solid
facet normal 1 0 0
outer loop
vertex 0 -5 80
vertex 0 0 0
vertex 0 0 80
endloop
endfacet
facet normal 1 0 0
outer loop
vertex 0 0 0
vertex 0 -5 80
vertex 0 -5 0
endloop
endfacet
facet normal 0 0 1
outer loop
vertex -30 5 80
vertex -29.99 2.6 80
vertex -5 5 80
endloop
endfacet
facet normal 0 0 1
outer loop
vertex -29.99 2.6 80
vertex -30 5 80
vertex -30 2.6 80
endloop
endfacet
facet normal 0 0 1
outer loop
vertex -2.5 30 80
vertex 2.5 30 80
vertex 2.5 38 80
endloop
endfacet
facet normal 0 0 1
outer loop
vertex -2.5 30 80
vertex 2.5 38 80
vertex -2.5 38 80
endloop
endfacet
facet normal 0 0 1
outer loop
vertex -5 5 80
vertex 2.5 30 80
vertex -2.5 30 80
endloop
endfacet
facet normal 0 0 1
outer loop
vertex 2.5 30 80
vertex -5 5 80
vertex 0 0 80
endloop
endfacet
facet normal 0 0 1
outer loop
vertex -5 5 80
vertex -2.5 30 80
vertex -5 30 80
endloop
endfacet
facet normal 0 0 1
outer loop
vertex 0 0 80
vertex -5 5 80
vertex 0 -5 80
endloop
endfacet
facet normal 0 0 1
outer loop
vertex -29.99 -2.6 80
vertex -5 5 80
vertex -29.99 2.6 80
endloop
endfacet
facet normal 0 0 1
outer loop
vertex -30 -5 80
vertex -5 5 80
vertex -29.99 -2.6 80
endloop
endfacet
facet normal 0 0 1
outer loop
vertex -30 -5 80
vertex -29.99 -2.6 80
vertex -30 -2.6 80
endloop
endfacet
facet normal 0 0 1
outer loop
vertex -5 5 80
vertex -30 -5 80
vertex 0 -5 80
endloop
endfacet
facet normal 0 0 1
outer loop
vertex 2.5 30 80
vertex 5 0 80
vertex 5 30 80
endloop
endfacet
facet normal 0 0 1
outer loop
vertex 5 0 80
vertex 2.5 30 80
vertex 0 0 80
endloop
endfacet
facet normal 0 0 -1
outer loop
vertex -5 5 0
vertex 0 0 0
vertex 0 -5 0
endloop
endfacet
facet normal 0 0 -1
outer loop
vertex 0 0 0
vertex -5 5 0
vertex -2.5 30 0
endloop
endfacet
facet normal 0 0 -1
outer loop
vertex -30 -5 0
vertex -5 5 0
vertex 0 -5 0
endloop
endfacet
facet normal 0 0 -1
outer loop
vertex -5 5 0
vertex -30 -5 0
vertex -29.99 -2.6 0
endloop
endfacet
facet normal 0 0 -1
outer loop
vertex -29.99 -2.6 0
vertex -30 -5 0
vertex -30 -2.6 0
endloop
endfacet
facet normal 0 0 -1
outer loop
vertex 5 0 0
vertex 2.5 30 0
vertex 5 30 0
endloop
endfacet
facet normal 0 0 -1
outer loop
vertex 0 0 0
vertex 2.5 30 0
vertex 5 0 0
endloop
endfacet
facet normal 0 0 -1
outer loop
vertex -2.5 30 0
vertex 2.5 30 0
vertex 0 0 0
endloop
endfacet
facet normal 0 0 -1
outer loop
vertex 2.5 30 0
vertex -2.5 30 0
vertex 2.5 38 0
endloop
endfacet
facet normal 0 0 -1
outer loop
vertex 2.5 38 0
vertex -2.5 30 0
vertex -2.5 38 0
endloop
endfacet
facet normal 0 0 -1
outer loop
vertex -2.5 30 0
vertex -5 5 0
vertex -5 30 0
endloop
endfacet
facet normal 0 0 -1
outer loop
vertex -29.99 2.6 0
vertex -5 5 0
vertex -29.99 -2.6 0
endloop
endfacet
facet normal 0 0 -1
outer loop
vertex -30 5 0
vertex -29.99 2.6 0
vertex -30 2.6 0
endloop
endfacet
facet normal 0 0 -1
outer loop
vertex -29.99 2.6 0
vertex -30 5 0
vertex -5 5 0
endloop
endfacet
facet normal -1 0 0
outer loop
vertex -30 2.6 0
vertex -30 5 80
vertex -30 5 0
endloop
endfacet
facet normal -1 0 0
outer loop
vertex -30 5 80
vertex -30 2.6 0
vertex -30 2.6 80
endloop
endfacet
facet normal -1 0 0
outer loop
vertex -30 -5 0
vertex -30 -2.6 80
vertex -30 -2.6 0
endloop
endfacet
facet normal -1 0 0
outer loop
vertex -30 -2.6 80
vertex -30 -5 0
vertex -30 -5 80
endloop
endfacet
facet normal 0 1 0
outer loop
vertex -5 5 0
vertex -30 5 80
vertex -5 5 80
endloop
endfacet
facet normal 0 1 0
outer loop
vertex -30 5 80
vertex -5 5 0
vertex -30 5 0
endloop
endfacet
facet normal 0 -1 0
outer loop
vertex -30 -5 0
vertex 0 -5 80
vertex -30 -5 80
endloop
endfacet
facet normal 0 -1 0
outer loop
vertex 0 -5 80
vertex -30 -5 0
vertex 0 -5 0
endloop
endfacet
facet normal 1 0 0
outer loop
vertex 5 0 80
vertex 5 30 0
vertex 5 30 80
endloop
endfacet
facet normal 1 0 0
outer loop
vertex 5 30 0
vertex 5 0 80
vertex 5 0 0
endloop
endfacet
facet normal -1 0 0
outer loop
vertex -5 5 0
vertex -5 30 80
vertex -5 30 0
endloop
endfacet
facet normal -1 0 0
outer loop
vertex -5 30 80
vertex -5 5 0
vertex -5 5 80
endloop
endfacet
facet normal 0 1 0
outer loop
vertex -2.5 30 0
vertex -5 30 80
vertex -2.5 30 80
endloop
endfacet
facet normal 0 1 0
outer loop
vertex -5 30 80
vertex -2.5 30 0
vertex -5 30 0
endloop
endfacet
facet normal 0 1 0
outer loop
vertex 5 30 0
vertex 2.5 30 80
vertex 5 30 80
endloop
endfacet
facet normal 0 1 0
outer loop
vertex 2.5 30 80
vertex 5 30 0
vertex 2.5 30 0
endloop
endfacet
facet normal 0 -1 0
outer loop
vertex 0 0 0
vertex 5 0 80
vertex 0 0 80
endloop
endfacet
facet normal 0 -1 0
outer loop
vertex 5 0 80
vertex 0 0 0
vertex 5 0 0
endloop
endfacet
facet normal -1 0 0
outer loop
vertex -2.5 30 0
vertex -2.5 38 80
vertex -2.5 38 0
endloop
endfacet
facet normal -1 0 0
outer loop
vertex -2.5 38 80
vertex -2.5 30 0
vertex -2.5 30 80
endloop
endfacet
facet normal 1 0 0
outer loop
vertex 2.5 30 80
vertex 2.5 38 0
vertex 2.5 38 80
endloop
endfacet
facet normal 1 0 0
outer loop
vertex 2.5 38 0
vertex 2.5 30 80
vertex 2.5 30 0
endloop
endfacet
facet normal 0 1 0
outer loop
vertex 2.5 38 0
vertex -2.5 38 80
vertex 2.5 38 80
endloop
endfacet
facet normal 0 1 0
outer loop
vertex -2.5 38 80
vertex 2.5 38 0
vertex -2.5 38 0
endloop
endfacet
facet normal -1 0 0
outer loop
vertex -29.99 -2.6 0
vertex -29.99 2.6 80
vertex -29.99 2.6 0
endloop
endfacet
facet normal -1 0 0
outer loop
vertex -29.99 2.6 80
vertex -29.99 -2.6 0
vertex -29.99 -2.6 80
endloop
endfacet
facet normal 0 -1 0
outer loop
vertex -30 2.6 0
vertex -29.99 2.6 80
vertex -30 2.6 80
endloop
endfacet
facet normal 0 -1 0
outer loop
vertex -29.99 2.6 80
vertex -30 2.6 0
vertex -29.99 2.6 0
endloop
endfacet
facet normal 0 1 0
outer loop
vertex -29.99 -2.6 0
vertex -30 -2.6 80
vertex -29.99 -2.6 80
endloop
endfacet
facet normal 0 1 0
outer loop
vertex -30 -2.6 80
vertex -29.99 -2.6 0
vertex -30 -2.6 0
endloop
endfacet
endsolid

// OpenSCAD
// file: common.scad
// Shared dimensions + joint primitives for the SaySpark maze kit.
// Edit values here once and every piece updates uniformly.
//
// Convention used by all pieces in this folder:
//   • Tab on the +X end (sticks out, plugs into the next piece's socket)
//   • Socket on the -X end (pocket cut in, accepts the previous piece's tab)
// Pieces chain end-to-end. Rotate corners 0/90/180/270° to aim turns.

/* [Wall geometry — mm] */
cell_size      = 80;   // [40:5:200]    wall body length (along chain axis)
wall_height    = 80;   // [20:1:120]    how tall the wall stands
wall_thickness = 10;   // [5:0.5:20]    how thick / "wide" the wall is

/* [Joint geometry — mm] */
tab_length     = 8;    // [4:1:15]      how far the tab sticks out / socket goes in
tab_thickness  = 5;    // [2:0.5:9]     tab cross-section (must be < wall_thickness)
slot_clearance = 0.2;  // [0.1:0.05:0.4]  printer tolerance gap

/* [Corner geometry — mm] */
arm_length     = 30;   // [15:1:60]     length of each corner arm

$fn = 48;

// ─── Joint primitives ────────────────────────────────────────────────────
// Tab — sticks out in +X from origin. Origin = base of tab where it joins
// the body. Full wall_height tall so the joint is as strong as the wall.
module joint_tab() {
  translate([0, -tab_thickness / 2, 0])
    cube([tab_length, tab_thickness, wall_height]);
}

// Socket — pocket carved from origin going in -X (into the body).
// Caller subtracts this from a body shape to cut the pocket.
// Sized slightly larger than the tab by `slot_clearance` so parts slide.
module joint_socket() {
  translate([-tab_length - 0.01,
             -(tab_thickness + slot_clearance) / 2,
             -0.01])
    cube([tab_length + 0.02,
          tab_thickness + slot_clearance,
          wall_height + 0.02]);
}
// main file
// Corner — 90° turn piece. Socket on the -X arm, tab on the +Y arm.
// Drops between two walls (or between any tab/socket pair) to turn the
// chain. Rotate the corner around Z by 0, 90, 180, or 270 degrees to
// aim the turn in any direction.
//
// Open in OpenSCAD, F5 to preview, F6 to render, File > Export > STL.

include <common.scad>;

module corner() {
  difference() {
    union() {
      // -X arm — runs from origin to (-arm_length, 0)
      translate([-arm_length, -wall_thickness / 2, 0])
        cube([arm_length, wall_thickness, wall_height]);
      // +Y arm — runs from origin to (0, +arm_length)
      translate([-wall_thickness / 2, 0, 0])
        cube([wall_thickness, arm_length, wall_height]);
      // Tab at the +Y arm end (sticks out in +Y; rotated joint_tab)
      translate([0, arm_length, 0])
        rotate([0, 0, 90])
          joint_tab();
    }
    // Socket at the -X arm end
    translate([-arm_length, 0, 0])
      joint_socket();
  }
}

corner();
